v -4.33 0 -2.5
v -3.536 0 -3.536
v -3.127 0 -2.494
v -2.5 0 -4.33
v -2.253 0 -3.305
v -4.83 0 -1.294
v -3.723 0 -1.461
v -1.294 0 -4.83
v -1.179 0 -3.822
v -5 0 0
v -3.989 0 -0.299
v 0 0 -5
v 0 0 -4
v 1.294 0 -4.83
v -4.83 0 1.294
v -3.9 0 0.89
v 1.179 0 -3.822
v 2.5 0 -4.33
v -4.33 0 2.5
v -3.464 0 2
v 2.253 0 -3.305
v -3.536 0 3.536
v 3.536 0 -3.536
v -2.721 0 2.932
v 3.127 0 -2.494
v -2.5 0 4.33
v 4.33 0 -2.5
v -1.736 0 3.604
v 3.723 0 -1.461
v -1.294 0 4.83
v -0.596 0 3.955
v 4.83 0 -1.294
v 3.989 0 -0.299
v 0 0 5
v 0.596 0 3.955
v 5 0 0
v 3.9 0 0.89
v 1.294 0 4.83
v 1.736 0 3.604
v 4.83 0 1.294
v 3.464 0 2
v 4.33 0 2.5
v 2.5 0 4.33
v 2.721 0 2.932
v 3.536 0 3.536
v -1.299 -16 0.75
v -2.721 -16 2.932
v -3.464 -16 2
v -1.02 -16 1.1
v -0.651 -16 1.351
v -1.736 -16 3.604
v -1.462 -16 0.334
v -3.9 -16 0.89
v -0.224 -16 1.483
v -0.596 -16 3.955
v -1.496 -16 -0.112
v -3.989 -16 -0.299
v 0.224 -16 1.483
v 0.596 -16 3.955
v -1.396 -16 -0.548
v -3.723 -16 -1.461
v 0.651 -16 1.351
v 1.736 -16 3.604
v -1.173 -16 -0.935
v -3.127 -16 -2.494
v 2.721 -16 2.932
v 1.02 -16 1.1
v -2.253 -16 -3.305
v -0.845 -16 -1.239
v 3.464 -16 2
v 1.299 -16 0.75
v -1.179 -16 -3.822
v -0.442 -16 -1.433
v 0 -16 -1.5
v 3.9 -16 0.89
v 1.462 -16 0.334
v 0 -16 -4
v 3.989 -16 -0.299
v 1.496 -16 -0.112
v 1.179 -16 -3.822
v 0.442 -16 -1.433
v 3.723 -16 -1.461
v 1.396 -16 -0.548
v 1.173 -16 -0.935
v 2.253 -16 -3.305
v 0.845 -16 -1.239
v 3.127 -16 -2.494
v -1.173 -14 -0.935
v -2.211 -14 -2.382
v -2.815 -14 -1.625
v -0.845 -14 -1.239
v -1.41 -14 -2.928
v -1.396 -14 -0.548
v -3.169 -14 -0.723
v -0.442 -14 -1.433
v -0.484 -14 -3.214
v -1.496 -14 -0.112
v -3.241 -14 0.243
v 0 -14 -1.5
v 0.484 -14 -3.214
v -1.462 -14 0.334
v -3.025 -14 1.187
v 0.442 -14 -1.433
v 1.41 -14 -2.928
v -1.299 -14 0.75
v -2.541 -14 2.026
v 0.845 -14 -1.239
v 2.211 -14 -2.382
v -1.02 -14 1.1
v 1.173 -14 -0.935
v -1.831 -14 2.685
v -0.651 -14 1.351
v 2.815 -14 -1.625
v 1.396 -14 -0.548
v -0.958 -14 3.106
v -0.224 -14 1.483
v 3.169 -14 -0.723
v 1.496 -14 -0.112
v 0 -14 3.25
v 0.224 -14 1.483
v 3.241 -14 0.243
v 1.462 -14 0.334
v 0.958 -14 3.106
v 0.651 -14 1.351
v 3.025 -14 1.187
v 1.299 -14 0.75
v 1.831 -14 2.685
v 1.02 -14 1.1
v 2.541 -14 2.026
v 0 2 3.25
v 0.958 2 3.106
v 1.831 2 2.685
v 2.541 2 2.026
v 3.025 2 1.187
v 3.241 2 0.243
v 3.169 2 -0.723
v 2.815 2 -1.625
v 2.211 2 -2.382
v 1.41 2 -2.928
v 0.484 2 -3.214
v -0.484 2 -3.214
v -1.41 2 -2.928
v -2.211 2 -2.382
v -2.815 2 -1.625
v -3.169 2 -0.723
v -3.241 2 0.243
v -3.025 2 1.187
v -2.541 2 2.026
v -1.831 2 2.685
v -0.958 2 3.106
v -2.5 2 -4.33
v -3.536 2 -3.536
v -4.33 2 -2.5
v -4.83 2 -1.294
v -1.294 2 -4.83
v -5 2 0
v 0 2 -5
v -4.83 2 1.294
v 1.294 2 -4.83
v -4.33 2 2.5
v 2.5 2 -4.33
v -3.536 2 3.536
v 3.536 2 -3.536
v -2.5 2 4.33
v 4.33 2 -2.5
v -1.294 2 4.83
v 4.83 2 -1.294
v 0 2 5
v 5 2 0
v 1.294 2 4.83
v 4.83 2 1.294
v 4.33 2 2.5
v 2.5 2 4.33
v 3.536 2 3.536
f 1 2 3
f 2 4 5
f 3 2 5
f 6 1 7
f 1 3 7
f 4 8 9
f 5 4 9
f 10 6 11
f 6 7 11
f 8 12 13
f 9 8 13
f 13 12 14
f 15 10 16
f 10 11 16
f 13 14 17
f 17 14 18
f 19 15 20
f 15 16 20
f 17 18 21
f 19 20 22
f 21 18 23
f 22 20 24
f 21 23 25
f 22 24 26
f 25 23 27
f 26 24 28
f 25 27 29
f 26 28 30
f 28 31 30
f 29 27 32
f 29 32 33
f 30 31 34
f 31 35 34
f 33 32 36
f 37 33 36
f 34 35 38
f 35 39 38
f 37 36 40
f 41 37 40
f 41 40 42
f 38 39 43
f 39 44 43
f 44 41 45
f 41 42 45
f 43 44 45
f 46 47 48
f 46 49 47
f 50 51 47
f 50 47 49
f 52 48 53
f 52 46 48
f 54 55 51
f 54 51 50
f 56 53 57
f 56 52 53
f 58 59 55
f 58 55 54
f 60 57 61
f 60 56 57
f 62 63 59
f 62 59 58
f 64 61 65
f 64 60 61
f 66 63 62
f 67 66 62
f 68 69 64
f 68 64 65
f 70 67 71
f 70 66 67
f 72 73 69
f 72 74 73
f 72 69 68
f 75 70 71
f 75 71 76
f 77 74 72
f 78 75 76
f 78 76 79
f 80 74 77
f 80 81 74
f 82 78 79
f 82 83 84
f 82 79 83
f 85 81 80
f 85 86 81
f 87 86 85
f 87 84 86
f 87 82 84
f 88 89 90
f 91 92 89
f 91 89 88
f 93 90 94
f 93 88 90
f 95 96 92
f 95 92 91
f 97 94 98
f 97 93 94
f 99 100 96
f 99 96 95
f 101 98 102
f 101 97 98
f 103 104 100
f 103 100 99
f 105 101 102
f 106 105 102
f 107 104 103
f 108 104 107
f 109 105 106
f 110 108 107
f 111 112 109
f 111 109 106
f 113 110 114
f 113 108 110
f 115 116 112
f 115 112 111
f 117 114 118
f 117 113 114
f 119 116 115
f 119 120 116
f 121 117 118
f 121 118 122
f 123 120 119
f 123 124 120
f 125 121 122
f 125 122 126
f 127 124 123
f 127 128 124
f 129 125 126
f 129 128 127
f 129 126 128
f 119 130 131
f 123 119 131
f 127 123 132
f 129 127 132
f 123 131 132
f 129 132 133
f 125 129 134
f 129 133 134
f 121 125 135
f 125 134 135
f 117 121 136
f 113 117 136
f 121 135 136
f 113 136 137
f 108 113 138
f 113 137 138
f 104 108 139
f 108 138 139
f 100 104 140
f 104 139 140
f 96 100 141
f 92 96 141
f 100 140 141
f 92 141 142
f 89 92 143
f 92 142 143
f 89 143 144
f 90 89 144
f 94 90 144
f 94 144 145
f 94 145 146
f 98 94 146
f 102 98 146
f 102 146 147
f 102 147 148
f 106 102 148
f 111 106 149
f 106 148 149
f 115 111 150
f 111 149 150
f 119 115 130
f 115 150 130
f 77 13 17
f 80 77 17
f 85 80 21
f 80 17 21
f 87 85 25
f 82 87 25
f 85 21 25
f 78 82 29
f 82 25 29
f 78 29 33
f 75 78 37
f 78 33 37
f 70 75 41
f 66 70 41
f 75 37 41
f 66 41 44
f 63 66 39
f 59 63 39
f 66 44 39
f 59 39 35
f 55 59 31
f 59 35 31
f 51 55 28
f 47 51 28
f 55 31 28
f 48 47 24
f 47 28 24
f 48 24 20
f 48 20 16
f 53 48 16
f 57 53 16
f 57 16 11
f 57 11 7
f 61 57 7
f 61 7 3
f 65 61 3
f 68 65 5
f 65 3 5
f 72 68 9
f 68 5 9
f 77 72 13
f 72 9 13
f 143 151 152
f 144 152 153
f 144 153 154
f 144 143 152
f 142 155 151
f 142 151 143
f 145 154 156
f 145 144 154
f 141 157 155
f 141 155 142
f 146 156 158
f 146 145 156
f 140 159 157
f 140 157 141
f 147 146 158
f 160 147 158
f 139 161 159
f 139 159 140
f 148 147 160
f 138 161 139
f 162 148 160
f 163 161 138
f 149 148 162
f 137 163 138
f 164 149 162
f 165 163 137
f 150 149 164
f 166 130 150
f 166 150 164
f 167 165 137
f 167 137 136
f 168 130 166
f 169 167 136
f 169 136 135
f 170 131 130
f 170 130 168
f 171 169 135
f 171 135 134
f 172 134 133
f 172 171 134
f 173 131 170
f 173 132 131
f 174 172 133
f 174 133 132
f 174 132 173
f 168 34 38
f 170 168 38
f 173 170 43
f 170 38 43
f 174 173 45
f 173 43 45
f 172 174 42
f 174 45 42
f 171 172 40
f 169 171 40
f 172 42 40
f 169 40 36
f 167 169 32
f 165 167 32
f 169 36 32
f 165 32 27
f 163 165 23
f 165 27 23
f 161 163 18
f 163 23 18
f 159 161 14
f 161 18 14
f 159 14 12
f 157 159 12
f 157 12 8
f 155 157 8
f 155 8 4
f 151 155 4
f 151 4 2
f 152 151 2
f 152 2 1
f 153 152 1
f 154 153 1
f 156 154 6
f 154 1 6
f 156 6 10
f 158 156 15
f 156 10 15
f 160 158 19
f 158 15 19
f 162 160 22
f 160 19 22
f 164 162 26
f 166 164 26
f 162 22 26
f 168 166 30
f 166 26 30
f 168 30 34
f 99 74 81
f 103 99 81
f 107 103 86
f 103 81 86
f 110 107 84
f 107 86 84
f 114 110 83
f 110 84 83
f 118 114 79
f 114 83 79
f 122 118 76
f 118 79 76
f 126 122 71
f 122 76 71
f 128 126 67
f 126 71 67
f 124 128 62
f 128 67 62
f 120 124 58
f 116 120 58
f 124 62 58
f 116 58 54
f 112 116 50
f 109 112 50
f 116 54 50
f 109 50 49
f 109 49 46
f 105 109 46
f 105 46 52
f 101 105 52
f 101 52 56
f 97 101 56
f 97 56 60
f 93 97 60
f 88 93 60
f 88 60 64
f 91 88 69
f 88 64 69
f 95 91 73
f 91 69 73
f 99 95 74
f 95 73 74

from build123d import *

# Parameters (mm, degrees)
SKIZZE1_R                       = 5
AUFSATZ_LINEAR_AUSTRAGEN1_DEPTH = 2
SKIZZE2_R                       = 4
AUFSATZ_LINEAR_AUSTRAGEN2_DEPTH = 16
SKIZZE3_R                       = 3.25
SCHNITT_LINEAR_AUSTRAGEN1_DEPTH = 16
SKIZZE4_R                       = 1.5
SCHNITT_LINEAR_AUSTRAGEN2_DEPTH = 2


with BuildPart() as part:
    # Skizze1 → Aufsatz-Linear austragen1 (new body)
    with BuildSketch(Plane(origin=(0, 0, 0), x_dir=(1, 0, 0), z_dir=(0, 1, 0))):
        with Locations(Location((0, 0, 0), (0, 0, 270))):
            Circle(SKIZZE1_R)
    extrude(amount=AUFSATZ_LINEAR_AUSTRAGEN1_DEPTH)

    # Skizze2 → Aufsatz-Linear austragen2 (add)
    with BuildSketch(Plane.XZ):
        with Locations(Location((0, 0, 0), (0, 0, 270))):
            Circle(SKIZZE2_R)
    extrude(amount=AUFSATZ_LINEAR_AUSTRAGEN2_DEPTH)

    # Skizze3 → Schnitt-Linear austragen1 (cut)
    with BuildSketch(Plane(origin=(0, 2, 0), x_dir=(1, 0, 0), z_dir=(0, 1, 0))):
        with Locations(Location((0, 0, 0), (0, 0, 270))):
            Circle(SKIZZE3_R)
    extrude(amount=-SCHNITT_LINEAR_AUSTRAGEN1_DEPTH, mode=Mode.SUBTRACT)

    # Skizze4 → Schnitt-Linear austragen2 (cut)
    with BuildSketch(Plane.XZ.offset(16)):
        with Locations(Location((0, 0, 0), (0, 0, 270))):
            Circle(SKIZZE4_R)
    extrude(amount=-SCHNITT_LINEAR_AUSTRAGEN2_DEPTH, mode=Mode.SUBTRACT)


solid = part.part
